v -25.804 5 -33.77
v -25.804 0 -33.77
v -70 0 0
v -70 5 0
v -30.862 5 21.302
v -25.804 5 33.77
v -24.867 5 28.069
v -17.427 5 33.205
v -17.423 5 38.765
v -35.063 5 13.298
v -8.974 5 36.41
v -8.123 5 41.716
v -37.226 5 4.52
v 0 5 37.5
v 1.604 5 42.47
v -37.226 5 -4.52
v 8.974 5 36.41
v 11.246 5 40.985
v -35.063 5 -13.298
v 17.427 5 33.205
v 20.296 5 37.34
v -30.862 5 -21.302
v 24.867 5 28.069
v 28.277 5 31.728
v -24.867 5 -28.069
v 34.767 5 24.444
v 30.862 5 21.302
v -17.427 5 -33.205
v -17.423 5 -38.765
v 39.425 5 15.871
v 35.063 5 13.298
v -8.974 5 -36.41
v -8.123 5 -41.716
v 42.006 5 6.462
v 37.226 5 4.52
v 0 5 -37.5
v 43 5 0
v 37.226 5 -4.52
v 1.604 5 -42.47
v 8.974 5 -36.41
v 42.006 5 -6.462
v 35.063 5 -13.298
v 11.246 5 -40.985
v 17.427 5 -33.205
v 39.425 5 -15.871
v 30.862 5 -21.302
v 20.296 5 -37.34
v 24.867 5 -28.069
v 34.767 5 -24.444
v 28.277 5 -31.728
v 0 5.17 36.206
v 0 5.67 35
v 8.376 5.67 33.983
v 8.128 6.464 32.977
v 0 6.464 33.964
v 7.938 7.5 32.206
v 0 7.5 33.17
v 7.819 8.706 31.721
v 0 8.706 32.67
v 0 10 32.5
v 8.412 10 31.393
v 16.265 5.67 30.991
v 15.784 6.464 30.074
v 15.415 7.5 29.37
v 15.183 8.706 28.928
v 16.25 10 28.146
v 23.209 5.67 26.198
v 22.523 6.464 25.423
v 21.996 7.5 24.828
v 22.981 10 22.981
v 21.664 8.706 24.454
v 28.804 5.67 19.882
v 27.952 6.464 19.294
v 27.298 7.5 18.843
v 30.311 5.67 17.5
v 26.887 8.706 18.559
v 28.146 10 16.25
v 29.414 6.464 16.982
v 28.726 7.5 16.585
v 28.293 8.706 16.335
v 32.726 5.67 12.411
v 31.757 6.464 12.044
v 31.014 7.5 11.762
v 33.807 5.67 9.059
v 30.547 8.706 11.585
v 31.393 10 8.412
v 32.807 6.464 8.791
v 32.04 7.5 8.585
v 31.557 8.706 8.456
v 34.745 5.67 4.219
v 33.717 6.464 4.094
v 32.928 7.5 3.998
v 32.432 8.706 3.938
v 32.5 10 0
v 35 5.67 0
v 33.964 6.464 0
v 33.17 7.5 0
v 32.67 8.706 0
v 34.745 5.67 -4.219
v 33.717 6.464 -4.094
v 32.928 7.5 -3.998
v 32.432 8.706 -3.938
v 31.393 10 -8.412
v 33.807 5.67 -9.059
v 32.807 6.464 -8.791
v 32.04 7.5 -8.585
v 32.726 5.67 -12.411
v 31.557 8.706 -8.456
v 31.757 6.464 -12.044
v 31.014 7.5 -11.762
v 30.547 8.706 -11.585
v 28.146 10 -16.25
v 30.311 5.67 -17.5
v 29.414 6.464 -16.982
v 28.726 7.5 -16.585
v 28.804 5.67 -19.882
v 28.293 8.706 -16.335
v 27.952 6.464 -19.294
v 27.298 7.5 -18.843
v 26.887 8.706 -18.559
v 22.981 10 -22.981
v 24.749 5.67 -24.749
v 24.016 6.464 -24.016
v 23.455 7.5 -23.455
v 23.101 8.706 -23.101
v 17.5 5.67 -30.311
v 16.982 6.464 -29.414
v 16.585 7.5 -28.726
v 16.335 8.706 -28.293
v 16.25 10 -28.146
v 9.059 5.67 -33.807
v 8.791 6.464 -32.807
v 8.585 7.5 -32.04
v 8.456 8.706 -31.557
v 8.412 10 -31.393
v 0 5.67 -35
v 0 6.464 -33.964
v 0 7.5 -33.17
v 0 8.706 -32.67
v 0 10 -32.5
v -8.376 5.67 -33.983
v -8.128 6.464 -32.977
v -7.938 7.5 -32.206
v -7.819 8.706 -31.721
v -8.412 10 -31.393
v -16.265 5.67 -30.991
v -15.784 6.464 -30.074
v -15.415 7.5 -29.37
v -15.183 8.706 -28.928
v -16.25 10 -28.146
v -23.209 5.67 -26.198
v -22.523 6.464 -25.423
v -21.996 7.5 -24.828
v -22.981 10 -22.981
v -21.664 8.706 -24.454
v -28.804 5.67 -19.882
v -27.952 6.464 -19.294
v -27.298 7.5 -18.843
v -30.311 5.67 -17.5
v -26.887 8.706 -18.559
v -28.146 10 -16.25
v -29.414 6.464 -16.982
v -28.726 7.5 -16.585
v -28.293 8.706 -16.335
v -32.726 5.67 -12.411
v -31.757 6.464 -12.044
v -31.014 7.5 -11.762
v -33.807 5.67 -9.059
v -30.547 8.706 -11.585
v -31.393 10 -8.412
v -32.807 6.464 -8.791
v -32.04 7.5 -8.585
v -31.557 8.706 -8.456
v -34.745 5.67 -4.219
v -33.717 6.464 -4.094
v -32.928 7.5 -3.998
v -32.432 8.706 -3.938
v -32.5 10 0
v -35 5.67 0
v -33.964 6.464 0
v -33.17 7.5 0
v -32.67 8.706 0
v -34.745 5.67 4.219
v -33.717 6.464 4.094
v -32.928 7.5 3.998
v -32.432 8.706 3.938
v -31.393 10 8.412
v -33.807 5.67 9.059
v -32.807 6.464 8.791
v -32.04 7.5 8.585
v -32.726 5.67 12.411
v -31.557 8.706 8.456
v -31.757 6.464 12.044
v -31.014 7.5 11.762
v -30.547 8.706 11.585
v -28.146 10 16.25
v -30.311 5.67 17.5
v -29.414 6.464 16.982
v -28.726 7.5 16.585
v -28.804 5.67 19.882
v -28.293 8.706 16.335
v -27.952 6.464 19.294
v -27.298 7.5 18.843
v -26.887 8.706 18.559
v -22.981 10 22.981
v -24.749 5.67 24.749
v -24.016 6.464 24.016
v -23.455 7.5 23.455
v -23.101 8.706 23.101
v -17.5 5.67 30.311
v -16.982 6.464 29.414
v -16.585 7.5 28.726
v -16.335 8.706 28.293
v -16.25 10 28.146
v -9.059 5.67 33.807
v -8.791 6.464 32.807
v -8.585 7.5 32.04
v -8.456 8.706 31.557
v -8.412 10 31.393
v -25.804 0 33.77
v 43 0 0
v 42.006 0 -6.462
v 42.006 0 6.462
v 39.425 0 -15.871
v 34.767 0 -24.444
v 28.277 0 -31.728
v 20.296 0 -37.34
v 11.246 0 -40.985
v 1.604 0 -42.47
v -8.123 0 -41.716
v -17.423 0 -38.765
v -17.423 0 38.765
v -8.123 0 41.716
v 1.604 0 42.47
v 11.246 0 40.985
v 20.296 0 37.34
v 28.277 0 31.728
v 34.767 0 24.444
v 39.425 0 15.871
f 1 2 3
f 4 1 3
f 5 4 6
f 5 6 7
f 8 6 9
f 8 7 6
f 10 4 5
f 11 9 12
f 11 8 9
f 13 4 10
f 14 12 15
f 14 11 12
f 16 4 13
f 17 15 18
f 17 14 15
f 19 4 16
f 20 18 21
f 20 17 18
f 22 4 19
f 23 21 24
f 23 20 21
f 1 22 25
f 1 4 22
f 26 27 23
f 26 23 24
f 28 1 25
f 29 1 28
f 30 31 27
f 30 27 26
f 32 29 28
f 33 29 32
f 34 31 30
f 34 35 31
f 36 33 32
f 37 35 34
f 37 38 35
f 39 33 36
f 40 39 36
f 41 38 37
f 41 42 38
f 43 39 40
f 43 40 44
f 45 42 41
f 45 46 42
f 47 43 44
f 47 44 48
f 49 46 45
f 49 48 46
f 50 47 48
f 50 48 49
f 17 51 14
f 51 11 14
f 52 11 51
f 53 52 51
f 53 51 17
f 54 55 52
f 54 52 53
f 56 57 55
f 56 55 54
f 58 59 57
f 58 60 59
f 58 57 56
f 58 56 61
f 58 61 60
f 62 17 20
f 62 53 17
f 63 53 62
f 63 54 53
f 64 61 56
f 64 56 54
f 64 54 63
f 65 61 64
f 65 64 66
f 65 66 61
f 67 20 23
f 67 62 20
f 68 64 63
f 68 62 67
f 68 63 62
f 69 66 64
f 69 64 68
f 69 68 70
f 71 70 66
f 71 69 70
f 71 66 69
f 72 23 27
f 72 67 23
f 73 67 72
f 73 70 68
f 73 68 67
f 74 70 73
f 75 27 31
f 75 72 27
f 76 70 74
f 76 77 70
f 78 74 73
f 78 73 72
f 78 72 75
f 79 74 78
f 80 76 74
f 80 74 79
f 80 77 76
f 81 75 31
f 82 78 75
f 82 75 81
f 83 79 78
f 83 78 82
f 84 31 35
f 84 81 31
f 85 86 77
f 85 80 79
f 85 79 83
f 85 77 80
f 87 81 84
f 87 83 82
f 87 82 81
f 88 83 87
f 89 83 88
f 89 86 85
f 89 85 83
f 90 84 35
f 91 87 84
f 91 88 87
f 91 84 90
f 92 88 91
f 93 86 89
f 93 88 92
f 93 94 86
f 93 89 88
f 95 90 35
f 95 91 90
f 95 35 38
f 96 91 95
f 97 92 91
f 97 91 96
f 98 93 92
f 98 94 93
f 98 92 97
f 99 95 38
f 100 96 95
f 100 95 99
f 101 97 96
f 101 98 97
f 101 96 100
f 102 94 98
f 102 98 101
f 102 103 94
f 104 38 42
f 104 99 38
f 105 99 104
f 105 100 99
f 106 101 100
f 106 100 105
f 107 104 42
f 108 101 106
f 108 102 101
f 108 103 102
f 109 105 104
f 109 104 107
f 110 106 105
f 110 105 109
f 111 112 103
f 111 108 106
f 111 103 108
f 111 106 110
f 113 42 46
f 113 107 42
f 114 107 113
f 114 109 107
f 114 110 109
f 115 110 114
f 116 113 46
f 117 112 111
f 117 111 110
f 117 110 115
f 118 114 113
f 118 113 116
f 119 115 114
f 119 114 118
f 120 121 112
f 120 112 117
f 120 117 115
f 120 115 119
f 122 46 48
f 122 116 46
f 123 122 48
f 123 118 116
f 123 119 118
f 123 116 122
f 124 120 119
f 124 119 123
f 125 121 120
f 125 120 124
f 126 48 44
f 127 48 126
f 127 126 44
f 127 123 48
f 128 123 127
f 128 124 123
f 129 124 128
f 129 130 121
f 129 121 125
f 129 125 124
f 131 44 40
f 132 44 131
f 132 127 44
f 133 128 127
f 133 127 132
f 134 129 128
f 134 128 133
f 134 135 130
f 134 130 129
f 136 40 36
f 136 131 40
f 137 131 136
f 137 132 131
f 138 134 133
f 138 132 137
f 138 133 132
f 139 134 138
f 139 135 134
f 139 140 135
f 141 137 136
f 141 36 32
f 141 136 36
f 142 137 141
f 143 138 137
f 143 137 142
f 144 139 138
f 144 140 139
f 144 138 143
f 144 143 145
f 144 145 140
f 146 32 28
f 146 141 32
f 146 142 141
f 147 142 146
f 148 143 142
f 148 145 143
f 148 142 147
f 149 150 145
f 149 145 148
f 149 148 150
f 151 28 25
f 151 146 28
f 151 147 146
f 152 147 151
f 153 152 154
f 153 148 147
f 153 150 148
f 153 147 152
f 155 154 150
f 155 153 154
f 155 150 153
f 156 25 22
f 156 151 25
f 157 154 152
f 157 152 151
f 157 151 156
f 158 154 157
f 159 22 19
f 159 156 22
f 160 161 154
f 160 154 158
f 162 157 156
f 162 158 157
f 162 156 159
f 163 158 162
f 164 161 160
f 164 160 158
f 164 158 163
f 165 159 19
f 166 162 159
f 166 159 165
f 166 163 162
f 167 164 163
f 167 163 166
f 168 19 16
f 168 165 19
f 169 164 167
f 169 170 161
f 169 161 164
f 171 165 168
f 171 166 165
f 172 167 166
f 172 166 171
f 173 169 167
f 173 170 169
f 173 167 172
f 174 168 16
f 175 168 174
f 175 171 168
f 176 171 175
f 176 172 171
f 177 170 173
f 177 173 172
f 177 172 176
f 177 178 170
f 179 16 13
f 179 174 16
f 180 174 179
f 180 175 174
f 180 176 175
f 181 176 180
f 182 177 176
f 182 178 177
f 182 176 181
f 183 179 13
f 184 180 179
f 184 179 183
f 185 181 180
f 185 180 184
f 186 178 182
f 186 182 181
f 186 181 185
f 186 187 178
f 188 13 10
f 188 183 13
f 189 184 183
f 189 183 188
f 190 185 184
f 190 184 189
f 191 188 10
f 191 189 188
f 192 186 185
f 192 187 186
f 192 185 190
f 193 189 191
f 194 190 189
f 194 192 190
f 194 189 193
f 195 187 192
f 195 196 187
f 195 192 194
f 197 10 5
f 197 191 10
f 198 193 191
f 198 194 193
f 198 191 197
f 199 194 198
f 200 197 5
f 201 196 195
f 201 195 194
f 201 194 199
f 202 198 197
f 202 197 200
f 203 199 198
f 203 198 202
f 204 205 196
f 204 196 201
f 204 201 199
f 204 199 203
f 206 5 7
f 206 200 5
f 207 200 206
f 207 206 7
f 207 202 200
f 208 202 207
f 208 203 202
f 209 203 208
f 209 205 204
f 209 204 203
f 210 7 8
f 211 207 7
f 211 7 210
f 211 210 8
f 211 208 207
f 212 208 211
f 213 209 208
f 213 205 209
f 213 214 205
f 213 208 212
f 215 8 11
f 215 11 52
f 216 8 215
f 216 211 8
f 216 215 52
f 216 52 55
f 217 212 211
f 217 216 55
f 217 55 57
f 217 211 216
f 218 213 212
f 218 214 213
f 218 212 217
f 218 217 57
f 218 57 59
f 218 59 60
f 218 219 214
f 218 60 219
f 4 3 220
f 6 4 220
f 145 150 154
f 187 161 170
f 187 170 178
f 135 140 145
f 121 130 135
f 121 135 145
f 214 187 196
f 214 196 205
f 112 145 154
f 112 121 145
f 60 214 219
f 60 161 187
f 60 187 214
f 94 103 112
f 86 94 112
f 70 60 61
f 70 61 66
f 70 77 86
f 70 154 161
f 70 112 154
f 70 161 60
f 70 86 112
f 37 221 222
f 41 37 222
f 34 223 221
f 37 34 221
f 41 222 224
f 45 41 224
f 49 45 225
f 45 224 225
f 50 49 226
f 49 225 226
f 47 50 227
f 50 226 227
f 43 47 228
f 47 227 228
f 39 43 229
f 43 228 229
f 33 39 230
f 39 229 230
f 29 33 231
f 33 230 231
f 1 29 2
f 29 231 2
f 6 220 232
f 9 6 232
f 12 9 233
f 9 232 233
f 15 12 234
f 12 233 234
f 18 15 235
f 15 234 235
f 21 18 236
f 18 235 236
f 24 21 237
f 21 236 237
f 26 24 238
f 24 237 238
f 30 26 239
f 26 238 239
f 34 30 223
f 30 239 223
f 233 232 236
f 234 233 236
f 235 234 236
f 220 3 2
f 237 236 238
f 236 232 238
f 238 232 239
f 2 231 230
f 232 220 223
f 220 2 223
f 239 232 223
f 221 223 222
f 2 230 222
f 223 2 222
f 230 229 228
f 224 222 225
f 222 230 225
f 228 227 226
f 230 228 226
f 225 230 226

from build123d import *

# Parameters (mm, degrees)
BOSS_EXTRUDE1_DEPTH = 5
SKETCH2_R           = 32.5
BOSS_EXTRUDE2_DEPTH = 5
FILLET1_R           = 5


with BuildPart() as part:
    # Sketch1 → Boss-Extrude1 (new body)
    with BuildSketch(Plane(origin=(0, 0, 0), x_dir=(1, 0, 0), z_dir=(0, 1, 0))):
        with BuildLine():
            Line((-25.803571429, 33.770189539), (-70, 0))
            Line((-70, 0), (-25.803571429, -33.770189539))
            ThreePointArc((-25.803571429, -33.770189539), (15.876337275, -39.423240794), (42.005813953, -6.462321108))
            Line((42.005813953, -6.462321108), (43, 0))
            Line((43, 0), (42.005813953, 6.462321108))
            ThreePointArc((42.005813953, 6.462321108), (15.876337275, 39.423240794), (-25.803571429, 33.770189539))
        make_face()
    extrude(amount=BOSS_EXTRUDE1_DEPTH)

    # Sketch2 → Boss-Extrude2 (add)
    with BuildSketch(Plane(origin=(0, 5, 0), x_dir=(1, 0, 0), z_dir=(0, 1, 0))):
        with Locations(Location((0, 0, 0), (0, 0, 270))):
            Circle(SKETCH2_R)
    extrude(amount=BOSS_EXTRUDE2_DEPTH)

    # Fillet1
    fillet1_edges = [part.edges().sort_by_distance(p)[0] for p in [
        (0, 5, -32.5),
    ]]
    fillet(fillet1_edges, radius=FILLET1_R - 0.0001)  # a hair under: the kernel refuses the full size


solid = part.part
